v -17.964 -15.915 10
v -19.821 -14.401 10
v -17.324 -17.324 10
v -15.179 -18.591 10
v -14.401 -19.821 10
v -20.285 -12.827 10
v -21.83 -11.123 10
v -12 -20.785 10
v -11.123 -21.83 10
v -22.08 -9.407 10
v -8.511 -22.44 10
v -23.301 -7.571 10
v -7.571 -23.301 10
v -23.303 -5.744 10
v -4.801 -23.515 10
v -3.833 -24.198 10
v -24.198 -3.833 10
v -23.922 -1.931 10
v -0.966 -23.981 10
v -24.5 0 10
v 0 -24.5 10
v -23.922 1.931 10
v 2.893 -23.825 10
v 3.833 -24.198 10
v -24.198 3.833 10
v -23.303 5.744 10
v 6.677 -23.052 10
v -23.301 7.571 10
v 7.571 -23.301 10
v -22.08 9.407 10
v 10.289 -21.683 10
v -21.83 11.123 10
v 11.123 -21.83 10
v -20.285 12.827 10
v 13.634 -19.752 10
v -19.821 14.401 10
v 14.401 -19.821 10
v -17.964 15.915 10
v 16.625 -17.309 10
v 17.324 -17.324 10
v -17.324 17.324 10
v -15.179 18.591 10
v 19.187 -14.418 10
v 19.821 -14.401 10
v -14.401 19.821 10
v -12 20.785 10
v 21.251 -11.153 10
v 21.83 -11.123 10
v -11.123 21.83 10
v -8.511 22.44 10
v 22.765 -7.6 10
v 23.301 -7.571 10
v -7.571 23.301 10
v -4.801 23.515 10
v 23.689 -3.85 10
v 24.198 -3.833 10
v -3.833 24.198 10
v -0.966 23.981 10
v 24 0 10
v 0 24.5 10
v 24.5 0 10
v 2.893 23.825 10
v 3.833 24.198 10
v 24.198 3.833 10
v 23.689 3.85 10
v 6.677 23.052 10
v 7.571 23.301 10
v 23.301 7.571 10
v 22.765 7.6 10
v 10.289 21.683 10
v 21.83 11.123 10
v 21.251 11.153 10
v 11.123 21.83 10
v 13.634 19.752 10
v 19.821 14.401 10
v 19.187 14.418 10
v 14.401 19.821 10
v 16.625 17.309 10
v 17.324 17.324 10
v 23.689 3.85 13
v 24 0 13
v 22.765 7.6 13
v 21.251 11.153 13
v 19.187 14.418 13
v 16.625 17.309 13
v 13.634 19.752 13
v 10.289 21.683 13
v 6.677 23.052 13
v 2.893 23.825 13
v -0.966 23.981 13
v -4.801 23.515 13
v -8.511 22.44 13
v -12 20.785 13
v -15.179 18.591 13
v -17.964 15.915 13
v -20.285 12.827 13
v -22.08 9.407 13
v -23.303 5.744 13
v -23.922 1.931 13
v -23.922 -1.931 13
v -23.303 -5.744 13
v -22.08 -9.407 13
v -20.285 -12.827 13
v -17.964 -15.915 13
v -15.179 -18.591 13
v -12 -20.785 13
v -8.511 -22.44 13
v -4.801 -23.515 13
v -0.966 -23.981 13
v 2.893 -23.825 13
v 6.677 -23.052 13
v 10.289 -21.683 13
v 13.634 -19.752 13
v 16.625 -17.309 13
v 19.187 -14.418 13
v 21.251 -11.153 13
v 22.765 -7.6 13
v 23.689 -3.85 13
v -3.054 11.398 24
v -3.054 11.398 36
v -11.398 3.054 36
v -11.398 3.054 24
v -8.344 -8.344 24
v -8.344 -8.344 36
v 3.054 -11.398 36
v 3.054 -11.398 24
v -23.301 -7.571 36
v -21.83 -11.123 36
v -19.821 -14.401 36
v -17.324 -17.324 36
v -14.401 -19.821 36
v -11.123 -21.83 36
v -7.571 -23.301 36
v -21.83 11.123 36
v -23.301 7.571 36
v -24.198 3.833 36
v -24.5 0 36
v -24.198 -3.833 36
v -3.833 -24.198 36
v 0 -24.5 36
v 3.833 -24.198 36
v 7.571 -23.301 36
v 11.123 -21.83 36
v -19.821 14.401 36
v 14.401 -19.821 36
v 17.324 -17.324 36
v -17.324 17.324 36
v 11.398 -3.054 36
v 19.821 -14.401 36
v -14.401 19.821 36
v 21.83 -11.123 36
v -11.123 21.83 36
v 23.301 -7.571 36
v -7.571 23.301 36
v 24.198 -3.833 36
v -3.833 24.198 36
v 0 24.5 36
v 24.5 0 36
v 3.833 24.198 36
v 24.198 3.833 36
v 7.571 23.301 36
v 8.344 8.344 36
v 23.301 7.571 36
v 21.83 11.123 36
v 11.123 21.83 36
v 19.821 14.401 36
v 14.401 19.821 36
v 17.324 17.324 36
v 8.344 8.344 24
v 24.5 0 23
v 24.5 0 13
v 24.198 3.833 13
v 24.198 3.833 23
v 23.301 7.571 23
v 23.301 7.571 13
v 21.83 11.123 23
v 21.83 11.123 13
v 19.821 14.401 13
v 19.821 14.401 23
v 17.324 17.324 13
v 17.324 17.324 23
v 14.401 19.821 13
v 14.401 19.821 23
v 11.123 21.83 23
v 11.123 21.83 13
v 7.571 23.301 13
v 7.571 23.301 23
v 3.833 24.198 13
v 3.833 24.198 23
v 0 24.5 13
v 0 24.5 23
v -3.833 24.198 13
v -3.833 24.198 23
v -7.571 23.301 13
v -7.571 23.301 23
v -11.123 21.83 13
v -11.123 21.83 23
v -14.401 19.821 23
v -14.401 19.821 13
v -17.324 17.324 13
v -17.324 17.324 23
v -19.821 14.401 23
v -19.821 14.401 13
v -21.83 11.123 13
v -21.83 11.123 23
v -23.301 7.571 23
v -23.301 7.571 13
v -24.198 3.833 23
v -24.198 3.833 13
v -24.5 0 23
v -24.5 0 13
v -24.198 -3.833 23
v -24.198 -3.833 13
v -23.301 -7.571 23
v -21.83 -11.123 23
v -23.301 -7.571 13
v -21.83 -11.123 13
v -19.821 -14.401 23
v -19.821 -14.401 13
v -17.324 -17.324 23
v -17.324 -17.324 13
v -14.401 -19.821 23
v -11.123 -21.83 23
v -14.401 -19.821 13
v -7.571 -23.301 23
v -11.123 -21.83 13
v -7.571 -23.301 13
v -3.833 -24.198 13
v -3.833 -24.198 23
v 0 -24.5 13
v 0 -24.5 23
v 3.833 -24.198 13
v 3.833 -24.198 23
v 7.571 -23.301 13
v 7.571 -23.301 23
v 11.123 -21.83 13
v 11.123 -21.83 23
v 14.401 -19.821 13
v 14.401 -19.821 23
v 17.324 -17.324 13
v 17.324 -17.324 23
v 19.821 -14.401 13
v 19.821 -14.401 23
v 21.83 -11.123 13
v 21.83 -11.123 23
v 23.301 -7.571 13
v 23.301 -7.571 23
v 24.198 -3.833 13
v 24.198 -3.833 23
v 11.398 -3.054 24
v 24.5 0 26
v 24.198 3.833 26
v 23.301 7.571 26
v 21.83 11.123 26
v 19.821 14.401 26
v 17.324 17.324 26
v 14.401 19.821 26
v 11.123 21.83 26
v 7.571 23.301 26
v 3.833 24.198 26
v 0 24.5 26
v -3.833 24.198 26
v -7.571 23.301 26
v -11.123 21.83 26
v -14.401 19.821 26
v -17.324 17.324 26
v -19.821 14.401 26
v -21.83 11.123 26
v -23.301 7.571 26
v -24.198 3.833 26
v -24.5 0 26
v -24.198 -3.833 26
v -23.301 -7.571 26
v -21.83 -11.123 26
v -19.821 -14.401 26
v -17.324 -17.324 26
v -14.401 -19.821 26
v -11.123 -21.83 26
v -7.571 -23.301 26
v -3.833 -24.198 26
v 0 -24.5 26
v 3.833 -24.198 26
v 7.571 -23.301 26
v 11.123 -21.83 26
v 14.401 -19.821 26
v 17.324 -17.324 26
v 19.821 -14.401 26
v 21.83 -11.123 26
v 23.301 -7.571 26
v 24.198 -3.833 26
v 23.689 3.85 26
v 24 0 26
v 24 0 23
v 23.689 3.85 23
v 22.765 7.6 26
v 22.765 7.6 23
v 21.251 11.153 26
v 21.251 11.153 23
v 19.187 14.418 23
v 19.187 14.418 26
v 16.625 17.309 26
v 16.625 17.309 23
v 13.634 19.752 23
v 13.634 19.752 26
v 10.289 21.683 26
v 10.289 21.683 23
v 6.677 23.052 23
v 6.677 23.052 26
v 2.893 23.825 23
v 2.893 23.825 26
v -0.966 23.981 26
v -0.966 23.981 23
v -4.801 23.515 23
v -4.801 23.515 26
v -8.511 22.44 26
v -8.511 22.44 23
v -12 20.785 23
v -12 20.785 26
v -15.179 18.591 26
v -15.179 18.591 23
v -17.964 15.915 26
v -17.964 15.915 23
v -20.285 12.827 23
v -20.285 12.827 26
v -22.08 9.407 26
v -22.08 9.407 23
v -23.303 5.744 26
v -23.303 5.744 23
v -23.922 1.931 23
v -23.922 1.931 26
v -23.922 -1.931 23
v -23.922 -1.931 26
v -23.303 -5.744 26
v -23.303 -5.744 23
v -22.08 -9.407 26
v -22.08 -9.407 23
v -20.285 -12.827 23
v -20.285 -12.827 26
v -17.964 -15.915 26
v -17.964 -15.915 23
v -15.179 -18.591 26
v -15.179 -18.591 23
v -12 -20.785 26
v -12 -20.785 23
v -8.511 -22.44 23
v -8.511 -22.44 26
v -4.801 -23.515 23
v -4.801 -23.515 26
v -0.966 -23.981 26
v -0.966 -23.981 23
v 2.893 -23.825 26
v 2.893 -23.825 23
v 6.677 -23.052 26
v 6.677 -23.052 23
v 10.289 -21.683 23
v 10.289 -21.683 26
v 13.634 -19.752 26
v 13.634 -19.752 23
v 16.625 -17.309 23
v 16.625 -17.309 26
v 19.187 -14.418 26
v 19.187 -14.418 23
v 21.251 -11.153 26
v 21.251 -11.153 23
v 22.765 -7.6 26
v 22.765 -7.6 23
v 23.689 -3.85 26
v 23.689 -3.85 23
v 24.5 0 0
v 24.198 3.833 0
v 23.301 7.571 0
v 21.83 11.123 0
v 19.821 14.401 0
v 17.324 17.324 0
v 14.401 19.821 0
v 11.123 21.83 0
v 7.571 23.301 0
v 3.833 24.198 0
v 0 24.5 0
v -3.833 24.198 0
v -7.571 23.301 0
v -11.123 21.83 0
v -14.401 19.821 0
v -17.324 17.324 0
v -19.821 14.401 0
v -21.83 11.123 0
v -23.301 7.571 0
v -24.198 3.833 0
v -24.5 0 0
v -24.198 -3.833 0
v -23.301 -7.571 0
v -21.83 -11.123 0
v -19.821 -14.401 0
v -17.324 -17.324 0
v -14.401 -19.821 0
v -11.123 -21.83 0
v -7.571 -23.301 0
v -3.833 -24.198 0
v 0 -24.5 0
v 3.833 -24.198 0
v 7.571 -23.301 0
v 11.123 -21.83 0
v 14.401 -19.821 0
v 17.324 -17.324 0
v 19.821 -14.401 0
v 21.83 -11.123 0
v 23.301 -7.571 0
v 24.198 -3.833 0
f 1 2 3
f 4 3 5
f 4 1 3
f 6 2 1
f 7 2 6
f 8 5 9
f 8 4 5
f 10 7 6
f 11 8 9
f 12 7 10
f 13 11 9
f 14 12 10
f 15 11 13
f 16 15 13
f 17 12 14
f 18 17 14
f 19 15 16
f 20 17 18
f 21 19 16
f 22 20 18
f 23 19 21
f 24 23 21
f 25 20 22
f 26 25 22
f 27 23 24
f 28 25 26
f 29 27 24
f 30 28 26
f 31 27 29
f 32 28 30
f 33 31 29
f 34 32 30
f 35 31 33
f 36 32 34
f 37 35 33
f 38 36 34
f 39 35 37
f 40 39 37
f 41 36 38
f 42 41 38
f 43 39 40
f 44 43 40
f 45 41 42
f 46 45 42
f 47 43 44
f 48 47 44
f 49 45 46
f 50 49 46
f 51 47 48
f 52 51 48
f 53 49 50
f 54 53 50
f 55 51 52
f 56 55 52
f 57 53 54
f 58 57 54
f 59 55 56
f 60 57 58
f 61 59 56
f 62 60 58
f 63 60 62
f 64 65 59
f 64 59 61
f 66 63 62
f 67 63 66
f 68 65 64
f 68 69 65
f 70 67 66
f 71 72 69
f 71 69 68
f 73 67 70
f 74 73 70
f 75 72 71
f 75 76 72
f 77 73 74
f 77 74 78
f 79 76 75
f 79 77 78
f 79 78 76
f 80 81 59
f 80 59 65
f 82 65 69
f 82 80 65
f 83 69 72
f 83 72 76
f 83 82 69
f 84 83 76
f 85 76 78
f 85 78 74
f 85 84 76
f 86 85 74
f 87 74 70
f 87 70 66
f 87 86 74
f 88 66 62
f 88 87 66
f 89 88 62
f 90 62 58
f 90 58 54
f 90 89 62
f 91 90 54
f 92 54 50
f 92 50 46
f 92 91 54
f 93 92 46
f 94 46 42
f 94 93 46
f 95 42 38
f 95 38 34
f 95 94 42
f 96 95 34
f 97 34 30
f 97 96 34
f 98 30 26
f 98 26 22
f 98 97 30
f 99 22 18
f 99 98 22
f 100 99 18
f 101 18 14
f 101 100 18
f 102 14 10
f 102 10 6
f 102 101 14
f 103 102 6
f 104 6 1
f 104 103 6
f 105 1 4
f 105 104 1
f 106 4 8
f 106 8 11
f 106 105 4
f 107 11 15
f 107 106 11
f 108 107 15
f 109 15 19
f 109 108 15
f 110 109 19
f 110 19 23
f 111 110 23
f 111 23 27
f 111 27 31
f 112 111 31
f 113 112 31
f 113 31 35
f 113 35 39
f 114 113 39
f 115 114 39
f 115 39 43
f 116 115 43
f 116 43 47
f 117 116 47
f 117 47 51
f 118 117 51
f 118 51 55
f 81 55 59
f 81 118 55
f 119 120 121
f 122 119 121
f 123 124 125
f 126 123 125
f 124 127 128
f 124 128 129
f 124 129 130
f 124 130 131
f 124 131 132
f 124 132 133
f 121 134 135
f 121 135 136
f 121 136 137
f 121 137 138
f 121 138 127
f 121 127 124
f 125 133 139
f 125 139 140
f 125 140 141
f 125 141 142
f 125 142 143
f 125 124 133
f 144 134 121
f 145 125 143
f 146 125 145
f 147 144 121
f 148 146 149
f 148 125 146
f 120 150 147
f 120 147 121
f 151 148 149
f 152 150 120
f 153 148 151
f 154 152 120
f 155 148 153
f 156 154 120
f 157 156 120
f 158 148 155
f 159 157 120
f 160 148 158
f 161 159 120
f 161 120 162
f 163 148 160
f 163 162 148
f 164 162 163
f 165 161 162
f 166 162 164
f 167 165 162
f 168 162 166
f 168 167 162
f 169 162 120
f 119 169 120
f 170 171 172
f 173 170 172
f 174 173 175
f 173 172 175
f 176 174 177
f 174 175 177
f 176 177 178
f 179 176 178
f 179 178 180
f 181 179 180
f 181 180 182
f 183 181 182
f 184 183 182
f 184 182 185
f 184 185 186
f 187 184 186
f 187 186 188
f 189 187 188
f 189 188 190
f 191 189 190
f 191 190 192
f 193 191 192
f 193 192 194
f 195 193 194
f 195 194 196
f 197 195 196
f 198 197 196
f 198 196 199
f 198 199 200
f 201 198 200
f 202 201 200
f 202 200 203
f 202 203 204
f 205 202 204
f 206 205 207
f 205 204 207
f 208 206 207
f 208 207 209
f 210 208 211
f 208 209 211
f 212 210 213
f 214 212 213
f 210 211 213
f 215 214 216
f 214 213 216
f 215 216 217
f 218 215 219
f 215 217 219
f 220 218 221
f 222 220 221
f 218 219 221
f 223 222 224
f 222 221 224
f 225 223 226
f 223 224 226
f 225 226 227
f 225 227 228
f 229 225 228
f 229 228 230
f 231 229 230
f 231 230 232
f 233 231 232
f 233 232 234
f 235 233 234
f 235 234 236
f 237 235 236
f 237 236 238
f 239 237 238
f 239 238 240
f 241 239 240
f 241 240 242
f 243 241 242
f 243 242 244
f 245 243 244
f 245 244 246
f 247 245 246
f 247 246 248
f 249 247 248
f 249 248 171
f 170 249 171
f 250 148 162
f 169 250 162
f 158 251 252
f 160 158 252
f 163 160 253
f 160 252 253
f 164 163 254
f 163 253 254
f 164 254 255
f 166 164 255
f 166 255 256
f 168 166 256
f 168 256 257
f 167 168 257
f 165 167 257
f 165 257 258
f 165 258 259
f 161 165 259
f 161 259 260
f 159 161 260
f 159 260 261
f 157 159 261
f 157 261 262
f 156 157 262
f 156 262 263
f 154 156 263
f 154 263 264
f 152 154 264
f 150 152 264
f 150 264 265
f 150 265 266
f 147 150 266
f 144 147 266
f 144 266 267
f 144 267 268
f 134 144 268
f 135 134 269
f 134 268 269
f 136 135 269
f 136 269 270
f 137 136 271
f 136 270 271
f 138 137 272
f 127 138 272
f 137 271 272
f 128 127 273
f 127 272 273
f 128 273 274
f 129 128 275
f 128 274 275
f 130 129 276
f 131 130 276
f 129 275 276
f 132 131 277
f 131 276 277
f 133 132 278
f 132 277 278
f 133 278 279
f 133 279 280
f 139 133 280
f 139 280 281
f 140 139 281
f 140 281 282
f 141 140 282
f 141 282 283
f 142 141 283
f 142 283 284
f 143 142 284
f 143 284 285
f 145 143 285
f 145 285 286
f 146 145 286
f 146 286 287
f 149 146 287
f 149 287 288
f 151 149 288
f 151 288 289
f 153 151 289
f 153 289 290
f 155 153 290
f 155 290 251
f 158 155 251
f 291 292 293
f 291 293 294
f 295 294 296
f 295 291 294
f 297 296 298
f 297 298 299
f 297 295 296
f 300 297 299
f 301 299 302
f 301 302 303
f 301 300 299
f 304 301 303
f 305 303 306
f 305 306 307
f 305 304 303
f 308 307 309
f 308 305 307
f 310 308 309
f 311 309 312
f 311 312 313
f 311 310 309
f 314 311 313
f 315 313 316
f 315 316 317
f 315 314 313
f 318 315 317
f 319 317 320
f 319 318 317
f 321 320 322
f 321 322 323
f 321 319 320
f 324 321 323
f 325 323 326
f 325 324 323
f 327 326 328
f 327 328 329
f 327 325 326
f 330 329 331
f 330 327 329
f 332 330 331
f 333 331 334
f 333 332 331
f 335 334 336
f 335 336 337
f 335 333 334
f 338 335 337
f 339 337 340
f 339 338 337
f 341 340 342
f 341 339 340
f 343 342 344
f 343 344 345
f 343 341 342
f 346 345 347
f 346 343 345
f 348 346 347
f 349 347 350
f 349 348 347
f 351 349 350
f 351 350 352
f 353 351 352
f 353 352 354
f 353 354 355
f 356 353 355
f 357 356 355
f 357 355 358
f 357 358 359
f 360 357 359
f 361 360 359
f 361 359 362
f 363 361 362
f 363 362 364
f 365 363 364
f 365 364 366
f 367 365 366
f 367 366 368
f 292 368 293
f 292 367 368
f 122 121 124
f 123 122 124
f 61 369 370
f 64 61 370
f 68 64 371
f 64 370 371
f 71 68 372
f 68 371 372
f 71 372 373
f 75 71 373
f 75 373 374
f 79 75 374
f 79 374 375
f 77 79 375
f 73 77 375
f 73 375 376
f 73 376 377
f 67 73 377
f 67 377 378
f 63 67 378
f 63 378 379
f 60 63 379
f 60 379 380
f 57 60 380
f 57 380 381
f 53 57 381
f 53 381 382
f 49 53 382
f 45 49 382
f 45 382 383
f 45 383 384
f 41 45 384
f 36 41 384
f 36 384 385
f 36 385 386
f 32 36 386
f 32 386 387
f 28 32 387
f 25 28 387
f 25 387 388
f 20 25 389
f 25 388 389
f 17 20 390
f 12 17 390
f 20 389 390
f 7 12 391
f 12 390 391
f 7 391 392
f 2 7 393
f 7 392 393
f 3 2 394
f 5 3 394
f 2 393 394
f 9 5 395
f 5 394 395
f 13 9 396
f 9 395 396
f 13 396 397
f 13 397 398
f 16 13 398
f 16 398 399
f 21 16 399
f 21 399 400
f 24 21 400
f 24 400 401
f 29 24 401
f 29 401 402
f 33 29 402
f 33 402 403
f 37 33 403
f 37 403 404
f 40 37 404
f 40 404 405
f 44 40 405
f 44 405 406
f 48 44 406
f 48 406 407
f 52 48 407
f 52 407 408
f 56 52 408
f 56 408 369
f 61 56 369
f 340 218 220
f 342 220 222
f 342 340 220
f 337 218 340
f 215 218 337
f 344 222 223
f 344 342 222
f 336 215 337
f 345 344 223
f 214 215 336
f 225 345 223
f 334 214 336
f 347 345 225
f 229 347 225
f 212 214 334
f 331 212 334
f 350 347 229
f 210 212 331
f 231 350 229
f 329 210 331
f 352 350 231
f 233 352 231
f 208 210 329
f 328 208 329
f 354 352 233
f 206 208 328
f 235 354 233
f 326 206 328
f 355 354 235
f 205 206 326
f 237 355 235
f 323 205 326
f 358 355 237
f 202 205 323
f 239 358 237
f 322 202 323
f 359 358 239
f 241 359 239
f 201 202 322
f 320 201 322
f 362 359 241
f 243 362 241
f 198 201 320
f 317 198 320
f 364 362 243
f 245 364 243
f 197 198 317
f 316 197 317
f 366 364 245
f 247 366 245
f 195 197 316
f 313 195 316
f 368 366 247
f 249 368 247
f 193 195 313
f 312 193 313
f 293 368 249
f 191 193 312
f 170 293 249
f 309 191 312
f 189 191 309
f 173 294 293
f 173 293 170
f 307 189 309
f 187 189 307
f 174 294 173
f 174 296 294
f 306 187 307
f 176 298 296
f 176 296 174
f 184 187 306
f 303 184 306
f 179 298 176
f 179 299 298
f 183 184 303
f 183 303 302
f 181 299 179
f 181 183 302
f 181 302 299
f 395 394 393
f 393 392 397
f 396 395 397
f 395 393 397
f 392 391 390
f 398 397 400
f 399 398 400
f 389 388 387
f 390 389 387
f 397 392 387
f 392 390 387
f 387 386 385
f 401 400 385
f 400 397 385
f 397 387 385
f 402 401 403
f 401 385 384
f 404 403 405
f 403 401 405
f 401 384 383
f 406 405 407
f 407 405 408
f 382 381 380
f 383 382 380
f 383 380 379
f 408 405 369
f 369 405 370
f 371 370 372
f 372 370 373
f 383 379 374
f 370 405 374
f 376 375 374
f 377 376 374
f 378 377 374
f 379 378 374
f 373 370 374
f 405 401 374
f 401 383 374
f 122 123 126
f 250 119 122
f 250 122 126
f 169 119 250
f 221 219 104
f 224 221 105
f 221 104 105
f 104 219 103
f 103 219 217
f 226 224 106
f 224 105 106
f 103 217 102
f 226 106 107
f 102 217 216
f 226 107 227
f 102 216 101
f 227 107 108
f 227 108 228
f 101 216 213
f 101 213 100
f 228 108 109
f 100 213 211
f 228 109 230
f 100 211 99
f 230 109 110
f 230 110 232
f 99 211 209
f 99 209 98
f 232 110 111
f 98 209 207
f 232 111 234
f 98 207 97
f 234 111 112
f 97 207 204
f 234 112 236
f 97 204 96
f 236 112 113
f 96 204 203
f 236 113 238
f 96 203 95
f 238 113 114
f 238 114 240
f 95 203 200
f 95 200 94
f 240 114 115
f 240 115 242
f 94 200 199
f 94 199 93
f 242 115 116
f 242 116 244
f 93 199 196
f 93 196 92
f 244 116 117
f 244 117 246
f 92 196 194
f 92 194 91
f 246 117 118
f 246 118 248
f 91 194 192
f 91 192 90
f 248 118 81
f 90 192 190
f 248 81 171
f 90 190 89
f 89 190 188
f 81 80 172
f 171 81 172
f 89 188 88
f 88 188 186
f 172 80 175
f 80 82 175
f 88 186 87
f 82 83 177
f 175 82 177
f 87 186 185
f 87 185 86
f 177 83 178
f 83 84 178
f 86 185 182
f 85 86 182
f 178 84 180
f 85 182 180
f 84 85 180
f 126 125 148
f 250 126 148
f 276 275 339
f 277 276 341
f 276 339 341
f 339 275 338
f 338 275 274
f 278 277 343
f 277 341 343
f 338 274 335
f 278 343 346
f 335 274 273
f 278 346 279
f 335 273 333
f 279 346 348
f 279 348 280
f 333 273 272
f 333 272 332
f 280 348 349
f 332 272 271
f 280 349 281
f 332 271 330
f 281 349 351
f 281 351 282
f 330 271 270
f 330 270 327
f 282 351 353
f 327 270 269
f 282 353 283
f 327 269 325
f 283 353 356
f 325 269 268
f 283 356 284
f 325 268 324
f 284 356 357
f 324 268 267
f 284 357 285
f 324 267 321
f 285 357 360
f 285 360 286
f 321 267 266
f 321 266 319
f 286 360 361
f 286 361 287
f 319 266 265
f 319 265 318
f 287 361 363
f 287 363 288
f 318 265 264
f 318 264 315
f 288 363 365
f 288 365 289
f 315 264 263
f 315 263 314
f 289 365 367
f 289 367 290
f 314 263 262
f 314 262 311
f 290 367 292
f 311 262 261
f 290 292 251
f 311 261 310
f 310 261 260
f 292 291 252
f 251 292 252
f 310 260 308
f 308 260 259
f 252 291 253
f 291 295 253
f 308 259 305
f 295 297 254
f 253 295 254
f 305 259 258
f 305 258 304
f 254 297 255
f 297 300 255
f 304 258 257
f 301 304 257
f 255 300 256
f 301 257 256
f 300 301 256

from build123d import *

# Parameters (mm, degrees)
SKETCH1_R           = 24.5
BOSS_EXTRUDE1_DEPTH = 36
CUT_EXTRUDE1_DEPTH  = 12
CUT_EXTRUDE2_START  = -10
SKETCH3_R           = 24.5
SKETCH3_R_2         = 24
CUT_EXTRUDE2_DEPTH  = 3
CUT_EXTRUDE3_START  = -23
SKETCH4_R           = 24.5
SKETCH4_R_2         = 24
CUT_EXTRUDE3_DEPTH  = 3


with BuildPart() as part:
    # Sketch1 → Boss-Extrude1 (new body)
    with BuildSketch(Plane.XY):
        Circle(SKETCH1_R)
    extrude(amount=BOSS_EXTRUDE1_DEPTH)

    # Sketch2 → Cut-Extrude1 (cut)
    with BuildSketch(Plane.XY.offset(36)):
        Polygon((8.343860018, 8.343860018), (-3.054064732, 11.39792475), (-11.39792475, 3.054064732), (-8.343860018, -8.343860018), (3.054064732, -11.39792475), (11.39792475, -3.054064732), align=None)
    extrude(amount=-CUT_EXTRUDE1_DEPTH, mode=Mode.SUBTRACT)

    # Sketch3 → Cut-Extrude2 (cut)
    with BuildSketch(Plane.XY.offset(36).offset(CUT_EXTRUDE2_START)):
        Circle(SKETCH3_R)
        Circle(SKETCH3_R_2, mode=Mode.SUBTRACT)
    extrude(amount=-CUT_EXTRUDE2_DEPTH, mode=Mode.SUBTRACT)

    # Sketch4 → Cut-Extrude3 (cut)
    with BuildSketch(Plane.XY.offset(36).offset(CUT_EXTRUDE3_START)):
        Circle(SKETCH4_R)
        Circle(SKETCH4_R_2, mode=Mode.SUBTRACT)
    extrude(amount=-CUT_EXTRUDE3_DEPTH, mode=Mode.SUBTRACT)


solid = part.part
